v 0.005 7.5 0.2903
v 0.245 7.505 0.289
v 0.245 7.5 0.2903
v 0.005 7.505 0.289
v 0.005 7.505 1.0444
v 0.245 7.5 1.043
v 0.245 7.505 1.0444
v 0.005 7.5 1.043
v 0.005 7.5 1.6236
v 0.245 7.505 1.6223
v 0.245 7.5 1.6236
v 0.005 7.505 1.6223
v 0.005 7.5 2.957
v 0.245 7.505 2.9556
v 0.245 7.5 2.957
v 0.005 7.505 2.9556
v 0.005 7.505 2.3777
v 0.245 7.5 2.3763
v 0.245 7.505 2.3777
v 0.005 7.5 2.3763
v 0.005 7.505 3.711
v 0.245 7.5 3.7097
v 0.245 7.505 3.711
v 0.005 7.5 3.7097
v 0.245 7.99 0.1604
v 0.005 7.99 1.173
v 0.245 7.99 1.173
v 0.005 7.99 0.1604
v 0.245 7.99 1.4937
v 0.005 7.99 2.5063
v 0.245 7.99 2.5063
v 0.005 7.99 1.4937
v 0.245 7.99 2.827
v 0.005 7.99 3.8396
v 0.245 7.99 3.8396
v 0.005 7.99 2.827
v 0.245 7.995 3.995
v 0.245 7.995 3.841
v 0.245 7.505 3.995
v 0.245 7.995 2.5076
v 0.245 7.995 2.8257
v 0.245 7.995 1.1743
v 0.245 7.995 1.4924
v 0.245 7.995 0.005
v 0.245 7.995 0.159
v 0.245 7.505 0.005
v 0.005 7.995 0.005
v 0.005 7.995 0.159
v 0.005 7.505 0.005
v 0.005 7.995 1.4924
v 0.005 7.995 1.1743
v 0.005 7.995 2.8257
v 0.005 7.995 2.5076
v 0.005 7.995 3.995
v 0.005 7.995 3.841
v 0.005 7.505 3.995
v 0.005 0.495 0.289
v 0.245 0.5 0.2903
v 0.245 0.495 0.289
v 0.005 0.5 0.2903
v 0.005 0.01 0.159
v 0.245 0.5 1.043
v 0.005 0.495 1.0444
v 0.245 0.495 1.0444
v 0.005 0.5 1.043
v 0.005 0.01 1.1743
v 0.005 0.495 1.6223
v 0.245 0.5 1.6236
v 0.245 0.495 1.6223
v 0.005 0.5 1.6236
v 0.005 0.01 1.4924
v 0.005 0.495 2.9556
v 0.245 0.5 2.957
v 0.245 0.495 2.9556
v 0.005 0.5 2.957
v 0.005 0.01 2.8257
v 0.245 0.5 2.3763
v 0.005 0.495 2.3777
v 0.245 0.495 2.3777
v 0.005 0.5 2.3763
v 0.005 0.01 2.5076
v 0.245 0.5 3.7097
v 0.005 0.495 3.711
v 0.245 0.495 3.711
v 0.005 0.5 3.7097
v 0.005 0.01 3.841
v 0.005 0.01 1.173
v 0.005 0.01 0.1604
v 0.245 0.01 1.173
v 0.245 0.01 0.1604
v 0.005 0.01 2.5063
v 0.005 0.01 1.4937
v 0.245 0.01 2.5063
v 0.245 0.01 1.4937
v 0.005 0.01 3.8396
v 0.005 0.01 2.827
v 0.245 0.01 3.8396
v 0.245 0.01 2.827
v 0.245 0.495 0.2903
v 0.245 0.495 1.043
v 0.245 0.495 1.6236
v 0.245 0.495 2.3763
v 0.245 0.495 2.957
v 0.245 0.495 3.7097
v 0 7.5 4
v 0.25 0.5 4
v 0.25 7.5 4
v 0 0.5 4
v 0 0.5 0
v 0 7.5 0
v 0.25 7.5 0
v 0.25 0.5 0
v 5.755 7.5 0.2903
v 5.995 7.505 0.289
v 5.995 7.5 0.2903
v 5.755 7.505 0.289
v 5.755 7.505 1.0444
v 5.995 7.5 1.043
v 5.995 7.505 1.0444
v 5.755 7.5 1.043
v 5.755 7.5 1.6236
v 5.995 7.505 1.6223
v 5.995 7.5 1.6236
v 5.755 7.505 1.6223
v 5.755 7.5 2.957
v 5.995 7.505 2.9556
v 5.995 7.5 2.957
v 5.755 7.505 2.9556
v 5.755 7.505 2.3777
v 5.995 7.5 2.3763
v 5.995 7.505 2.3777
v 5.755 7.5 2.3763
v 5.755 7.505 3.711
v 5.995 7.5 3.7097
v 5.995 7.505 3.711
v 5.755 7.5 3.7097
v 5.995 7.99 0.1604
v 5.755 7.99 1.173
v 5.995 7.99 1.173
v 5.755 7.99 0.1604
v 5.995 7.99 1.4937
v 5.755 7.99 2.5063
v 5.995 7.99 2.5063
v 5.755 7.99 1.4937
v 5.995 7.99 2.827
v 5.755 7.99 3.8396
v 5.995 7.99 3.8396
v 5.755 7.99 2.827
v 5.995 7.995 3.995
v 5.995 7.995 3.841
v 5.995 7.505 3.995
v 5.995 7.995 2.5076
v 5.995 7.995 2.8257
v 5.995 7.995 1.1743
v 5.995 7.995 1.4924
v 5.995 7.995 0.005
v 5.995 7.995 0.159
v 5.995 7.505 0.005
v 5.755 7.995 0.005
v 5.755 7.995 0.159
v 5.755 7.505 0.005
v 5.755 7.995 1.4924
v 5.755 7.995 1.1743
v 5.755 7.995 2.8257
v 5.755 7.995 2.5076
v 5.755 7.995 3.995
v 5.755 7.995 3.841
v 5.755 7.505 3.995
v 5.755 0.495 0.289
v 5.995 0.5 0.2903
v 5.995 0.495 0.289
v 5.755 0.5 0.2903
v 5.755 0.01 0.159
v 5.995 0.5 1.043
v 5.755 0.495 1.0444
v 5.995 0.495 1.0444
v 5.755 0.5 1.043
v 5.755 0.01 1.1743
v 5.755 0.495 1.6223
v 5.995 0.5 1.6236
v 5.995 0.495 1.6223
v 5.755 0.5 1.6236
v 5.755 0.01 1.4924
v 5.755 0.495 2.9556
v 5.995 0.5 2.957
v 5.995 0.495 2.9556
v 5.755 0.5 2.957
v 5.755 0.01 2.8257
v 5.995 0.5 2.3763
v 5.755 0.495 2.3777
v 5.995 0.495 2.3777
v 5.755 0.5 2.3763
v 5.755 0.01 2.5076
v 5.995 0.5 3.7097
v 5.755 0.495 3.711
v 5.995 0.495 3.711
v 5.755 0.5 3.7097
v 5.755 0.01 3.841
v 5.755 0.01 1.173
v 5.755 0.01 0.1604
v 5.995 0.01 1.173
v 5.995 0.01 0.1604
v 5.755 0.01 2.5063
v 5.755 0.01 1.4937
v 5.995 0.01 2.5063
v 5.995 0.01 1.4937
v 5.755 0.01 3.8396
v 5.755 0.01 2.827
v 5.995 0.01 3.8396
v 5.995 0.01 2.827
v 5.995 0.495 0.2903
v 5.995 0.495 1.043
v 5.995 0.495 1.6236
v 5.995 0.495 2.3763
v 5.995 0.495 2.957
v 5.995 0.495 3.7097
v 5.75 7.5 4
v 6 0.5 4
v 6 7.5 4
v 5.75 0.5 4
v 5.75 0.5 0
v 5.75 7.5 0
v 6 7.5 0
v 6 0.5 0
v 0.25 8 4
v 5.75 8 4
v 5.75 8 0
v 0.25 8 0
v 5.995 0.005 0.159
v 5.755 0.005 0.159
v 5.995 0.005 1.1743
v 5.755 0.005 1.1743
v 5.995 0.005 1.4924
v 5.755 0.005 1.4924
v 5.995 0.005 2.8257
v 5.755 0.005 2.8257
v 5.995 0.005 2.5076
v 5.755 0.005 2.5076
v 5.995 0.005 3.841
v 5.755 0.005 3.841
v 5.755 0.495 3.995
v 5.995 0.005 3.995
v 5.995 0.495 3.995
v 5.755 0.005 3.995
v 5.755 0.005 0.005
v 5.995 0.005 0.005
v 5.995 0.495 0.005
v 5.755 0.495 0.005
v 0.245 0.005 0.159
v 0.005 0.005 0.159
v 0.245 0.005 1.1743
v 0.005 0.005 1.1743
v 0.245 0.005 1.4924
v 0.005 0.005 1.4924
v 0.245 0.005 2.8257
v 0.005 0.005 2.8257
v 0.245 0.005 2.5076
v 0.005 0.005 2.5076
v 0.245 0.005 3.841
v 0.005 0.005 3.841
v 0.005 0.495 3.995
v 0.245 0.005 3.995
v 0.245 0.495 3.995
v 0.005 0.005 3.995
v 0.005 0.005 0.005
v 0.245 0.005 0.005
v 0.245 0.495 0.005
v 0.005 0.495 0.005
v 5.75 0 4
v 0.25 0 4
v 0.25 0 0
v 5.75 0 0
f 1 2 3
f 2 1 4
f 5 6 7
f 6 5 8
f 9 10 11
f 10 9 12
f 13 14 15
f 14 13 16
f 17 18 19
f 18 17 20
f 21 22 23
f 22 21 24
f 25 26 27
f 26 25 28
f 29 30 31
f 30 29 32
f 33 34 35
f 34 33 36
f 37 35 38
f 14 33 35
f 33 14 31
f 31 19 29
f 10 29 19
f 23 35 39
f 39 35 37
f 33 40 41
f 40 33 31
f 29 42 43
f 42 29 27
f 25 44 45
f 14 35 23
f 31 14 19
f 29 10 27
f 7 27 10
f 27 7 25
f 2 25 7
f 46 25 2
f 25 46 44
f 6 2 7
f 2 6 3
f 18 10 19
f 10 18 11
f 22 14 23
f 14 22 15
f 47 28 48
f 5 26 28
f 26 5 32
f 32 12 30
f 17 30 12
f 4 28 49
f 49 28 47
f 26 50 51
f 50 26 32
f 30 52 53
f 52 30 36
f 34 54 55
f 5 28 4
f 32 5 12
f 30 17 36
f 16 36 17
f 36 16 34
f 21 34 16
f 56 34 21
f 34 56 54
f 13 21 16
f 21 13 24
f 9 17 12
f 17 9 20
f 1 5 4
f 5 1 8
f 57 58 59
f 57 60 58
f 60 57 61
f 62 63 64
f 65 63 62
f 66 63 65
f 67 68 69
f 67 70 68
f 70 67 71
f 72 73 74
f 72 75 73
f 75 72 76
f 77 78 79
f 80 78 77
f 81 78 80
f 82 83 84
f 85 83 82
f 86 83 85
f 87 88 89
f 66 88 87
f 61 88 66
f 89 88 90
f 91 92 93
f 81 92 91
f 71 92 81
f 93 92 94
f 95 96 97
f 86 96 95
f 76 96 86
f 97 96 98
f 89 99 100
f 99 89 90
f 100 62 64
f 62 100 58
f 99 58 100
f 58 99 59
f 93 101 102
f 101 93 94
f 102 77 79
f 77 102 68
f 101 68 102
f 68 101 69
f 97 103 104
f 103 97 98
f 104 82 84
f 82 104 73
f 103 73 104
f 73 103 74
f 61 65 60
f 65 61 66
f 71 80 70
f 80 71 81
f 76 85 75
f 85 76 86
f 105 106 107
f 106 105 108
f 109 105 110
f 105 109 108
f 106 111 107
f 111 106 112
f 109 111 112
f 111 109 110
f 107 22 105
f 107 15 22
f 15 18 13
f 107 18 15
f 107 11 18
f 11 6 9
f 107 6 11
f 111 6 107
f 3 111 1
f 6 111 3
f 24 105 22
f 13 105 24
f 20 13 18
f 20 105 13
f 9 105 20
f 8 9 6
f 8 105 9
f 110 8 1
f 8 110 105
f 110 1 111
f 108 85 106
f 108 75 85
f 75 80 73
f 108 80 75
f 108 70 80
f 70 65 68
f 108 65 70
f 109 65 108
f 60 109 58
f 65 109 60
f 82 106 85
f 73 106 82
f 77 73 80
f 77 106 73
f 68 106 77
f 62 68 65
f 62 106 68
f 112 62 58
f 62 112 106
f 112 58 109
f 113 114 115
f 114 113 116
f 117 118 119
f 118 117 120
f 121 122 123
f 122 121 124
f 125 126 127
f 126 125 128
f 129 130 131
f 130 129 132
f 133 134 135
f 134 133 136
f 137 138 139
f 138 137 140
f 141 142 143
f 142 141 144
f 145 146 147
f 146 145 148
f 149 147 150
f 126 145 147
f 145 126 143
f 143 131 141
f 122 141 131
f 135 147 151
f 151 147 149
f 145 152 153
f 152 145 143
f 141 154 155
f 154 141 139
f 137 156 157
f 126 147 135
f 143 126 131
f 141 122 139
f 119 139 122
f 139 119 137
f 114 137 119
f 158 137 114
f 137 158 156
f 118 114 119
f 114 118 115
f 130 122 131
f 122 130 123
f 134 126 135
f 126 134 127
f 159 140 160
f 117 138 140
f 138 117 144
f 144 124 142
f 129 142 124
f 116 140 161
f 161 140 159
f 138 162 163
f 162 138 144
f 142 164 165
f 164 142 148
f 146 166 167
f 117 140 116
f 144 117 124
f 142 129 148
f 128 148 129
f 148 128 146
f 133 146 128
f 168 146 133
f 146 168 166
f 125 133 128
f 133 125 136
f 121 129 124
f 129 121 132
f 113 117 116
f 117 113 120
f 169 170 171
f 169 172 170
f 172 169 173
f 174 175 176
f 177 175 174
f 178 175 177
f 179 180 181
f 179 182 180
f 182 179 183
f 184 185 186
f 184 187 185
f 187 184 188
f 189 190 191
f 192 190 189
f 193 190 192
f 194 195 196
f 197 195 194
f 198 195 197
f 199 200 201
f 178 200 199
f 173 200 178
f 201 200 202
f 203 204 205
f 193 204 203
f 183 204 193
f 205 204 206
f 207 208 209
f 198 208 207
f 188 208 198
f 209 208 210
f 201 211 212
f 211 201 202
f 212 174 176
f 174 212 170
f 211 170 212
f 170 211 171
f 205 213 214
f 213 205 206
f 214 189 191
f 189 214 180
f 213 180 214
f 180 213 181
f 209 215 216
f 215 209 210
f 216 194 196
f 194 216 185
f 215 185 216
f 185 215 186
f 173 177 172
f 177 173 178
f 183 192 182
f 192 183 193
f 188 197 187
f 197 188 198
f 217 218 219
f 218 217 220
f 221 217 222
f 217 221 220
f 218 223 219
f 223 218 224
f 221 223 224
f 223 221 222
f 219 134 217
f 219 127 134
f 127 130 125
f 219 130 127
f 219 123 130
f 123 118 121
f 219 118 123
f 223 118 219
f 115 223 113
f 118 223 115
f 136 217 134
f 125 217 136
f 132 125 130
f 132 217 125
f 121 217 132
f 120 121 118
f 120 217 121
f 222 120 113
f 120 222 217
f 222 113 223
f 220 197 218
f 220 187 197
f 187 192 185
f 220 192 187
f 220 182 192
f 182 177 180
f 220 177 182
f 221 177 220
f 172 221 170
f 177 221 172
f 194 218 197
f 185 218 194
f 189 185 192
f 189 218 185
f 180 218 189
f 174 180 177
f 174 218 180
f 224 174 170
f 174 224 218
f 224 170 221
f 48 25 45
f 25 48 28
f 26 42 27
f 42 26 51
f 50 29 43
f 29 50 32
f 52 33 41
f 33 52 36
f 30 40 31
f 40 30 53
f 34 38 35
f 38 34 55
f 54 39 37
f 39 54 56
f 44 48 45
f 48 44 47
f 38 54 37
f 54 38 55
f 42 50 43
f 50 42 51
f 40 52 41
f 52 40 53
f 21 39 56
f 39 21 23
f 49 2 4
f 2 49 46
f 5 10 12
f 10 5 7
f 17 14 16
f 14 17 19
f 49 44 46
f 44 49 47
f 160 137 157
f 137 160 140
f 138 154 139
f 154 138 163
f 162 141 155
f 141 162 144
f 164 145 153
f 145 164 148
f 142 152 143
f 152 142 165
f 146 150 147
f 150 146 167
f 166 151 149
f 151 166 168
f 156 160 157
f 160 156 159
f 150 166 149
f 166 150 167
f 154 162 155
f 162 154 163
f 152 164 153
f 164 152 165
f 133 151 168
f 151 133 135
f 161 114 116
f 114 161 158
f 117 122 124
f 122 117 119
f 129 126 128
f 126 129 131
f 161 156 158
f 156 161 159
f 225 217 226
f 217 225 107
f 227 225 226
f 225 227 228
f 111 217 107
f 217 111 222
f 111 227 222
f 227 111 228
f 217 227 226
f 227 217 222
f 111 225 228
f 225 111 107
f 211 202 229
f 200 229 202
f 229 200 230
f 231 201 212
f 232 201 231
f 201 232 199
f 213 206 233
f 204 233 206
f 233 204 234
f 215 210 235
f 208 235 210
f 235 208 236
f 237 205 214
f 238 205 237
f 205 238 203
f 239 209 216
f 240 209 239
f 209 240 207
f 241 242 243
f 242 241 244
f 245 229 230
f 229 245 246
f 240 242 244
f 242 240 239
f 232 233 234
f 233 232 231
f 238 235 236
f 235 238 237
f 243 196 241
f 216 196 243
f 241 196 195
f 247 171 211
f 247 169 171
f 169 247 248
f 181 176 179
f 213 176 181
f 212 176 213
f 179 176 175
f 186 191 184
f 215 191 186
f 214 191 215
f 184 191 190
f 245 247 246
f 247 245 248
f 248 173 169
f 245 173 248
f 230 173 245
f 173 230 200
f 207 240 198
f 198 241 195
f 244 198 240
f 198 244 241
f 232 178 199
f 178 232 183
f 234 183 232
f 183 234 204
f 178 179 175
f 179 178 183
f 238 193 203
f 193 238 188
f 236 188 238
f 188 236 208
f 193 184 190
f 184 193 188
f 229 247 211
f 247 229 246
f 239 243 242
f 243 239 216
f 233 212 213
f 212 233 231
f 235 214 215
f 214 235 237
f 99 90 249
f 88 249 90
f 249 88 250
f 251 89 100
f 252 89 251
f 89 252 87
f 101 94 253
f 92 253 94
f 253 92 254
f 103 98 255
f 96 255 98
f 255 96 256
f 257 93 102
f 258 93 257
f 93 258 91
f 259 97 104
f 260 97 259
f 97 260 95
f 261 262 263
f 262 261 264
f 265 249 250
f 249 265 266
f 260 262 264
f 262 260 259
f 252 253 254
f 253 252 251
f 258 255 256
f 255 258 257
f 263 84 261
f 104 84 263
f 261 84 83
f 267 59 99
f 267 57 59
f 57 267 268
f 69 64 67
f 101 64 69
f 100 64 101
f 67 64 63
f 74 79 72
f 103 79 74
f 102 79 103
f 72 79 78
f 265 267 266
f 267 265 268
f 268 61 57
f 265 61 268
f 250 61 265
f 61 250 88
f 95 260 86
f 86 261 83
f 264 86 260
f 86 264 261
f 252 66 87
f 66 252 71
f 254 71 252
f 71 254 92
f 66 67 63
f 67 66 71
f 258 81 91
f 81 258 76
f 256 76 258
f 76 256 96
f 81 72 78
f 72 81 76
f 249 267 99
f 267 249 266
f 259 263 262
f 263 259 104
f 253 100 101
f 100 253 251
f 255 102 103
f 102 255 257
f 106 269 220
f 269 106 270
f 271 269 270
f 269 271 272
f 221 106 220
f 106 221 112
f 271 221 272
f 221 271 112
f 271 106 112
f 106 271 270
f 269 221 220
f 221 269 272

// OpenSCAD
// file: dovetails.scad
/**
 * pin_length is measured along the same axis as the length of the board.
 * pin_width is the width of the bottom of the pins, where they're widest.
 * pin_thickness is measured along the same axis as the board thickness.
 * tail_width is the width of the tails where they meet the bottom of the pins, where they're narrowest.
 */
module dovetail_pins(pin_length=.75, pin_width=1, pin_thickness=.75, pin_count=4, angle=15, tail_width=1) {
    intersection() {
        translate([0.005, 0.005, 0.005]) cube([(pin_count-1)*(pin_width+tail_width)-0.01, pin_length-0.01, pin_thickness-0.01]);
        dovetail_pins_idealized(
            pin_length=pin_length,
            pin_width=pin_width,
            pin_thickness=pin_thickness,
            pin_count=pin_count,
            angle=angle,
            tail_width=tail_width
        );
    }
}

/**
 * tail_length is measured along the same axis as the length of the board.
 * tail_width is the width of the tails where they meet the board, where they're narrowest.
 * tail_thickness is measured along the same axis as the board thickness.
 * pin_width is the width of the bottom of the pins, where they're widest.
 */
module dovetail_tails(tail_length=.75, tail_width=1, tail_thickness=.75, tail_count=3, angle=15, pin_width=1) {
    pin_count = tail_count + 1;
    pin_thickness = tail_length;
    pin_length = tail_thickness;
    
    translate([0, 0, tail_thickness]) {
        rotate([-90, 0, 0]) {
            translate([0, 0, -0.005]) {
                difference() {
                    translate([0.005, 0.005, 0.005]) {
                        cube([(pin_count-1)*(pin_width+tail_width)-0.01, tail_thickness-0.01, tail_length-0.01]);
                    }

                    dovetail_pins_idealized(
                        pin_length=pin_length,
                        pin_width=pin_width,
                        pin_thickness=pin_thickness,
                        pin_count=pin_count,
                        angle=angle,
                        tail_width=tail_width
                    );
                }
            }
        }
    }
}

/**
 * Used for generating both pins and tails. Don't call this directly.
 */
module dovetail_pins_idealized(
    pin_length=.75,
    pin_width=1,
    pin_thickness=.75,
    pin_count=4,
    angle=15,
    tail_width=1) {
        
    pin_width_top = pin_width - ( 2 * tan(angle) * pin_thickness );
    
    translate([0, pin_length, 0]) {
        rotate([90, 0, 0]) {
            intersection() {
                cube([(pin_count-1)*(pin_width+tail_width), pin_thickness, pin_length]);
                
                for (pin = [0:pin_count-1]) {
                    translate([pin * (pin_width + tail_width), 0]) {
                        linear_extrude(pin_length) {
                            polygon([
                                [-pin_width/2, 0], 
                                [-pin_width_top/2, pin_thickness],
                                [pin_width_top/2, pin_thickness],
                                [pin_width/2, 0]
                            ]);
                        }
                    }
                }
            }
        }
    }
}

/**
 * Determine the width the pins need to be once the tail widths are chosen.
 */
function pin_width (tail_width, tail_count, board_width) = ( board_width - (tail_width * tail_count) ) / (tail_count);

/**
 * Construct a board with tails cut into it. board_length includes the length of the tails.
 */
module board_with_dovetail_tails(board_length, board_width, board_thickness, tail_length, tail_width, pin_width, tail_count, angle) {
    
    tail_thickness = board_thickness;
    
    pin_width = pin_width(tail_width = tail_width, tail_count=tail_count, board_width=board_width);
    translate([0, board_length - ( 2 * tail_length) + tail_length, 0]) {
        dovetail_tails(tail_length=tail_length, tail_width=tail_width, tail_thickness=tail_thickness, tail_count=tail_count, angle=angle, pin_width=pin_width);
    }
    translate([0, tail_length, 0]) cube([board_width, board_length - ( 2 * tail_length), board_thickness]);
    translate([0, tail_length, 0]) mirror([0,1,0]) dovetail_tails(tail_length=tail_length, tail_width=tail_width, tail_thickness=tail_thickness, tail_count=tail_count, angle=angle, pin_width=pin_width);
}

/**
 * Construct a board with pins cut into it. board_length includes the length of the pins.
 */
module board_with_dovetail_pins(board_length, board_width, board_thickness, pin_length, tail_width, pin_width, pin_count, angle) {
    translate([0, board_length - ( 2 * pin_length) + pin_length, 0]) {
        dovetail_pins(pin_length=pin_length, pin_width=pin_width, pin_thickness=board_thickness, pin_count=pin_count, angle=angle, tail_width=tail_width);
    }
    translate([0, pin_length, 0]) cube([board_width, board_length - ( 2 * pin_length), board_thickness]);
        dovetail_pins(pin_length=pin_length, pin_width=pin_width, pin_thickness=board_thickness, pin_count=pin_count, angle=angle, tail_width=tail_width);
}

// An example set of boards.
tail_width = .75;
tail_count = 3;
board_width = 4;
angle = 15;
board_thickness = 0.5;
pin_width = pin_width(tail_width = tail_width, tail_count=tail_count, board_width=board_width);

board_with_dovetail_tails(
    board_length=8,
    board_width=board_width,
    board_thickness=board_thickness,
    tail_length=.5,
    tail_width=tail_width,
    pin_width=pin_width,
    tail_count=tail_count,
    angle=angle
);

translate([board_width + 1, 0, 0]) board_with_dovetail_pins(
    board_length=6,
    board_width=board_width,
    board_thickness=board_thickness,
    pin_length=.5,
    tail_width=tail_width,
    pin_width=pin_width,
    pin_count = tail_count + 1,
    angle=angle
);
// main file
use <dovetails.scad>;

tail_width = .75;
tail_count = 3;
board_width = 4;
angle = 15;
board_thickness = 0.25;
board_thickness_2 = 0.5;
pin_width = pin_width(tail_width = tail_width, tail_count=tail_count, board_width=board_width);

color( "white" ) translate([board_thickness, 0, 0]) rotate([0, -90, 0])
board_with_dovetail_tails(
    board_length=8,
    board_width=board_width,
    board_thickness=board_thickness,
    tail_length=board_thickness_2,
    tail_width=tail_width,
    pin_width=pin_width,
    tail_count=tail_count,
    angle=angle
);

color( "white" ) translate([6, 0, 0]) rotate([0, -90, 0]) board_with_dovetail_tails(
    board_length=8,
    board_width=board_width,
    board_thickness=board_thickness,
    tail_length=board_thickness_2,
    tail_width=tail_width,
    pin_width=pin_width,
    tail_count=tail_count,
    angle=angle
);

color( "brown" ) translate([0, 8, 0]) rotate([0, 0, -90]) translate([board_thickness_2, 0, 0]) rotate([0, -90, 0])board_with_dovetail_pins(
    board_length=6,
    board_width=board_width,
    board_thickness=board_thickness_2,
    pin_length=board_thickness,
    tail_width=tail_width,
    pin_width=pin_width,
    pin_count = tail_count + 1,
    angle=angle
);

color( "brown" ) translate([6, 0, 0]) rotate([0, 0, 90]) translate([board_thickness_2, 0, 0]) rotate([0, -90, 0])board_with_dovetail_pins(
    board_length=6,
    board_width=board_width,
    board_thickness=board_thickness_2,
    pin_length=board_thickness,
    tail_width=tail_width,
    pin_width=pin_width,
    pin_count = tail_count + 1,
    angle=angle
);
